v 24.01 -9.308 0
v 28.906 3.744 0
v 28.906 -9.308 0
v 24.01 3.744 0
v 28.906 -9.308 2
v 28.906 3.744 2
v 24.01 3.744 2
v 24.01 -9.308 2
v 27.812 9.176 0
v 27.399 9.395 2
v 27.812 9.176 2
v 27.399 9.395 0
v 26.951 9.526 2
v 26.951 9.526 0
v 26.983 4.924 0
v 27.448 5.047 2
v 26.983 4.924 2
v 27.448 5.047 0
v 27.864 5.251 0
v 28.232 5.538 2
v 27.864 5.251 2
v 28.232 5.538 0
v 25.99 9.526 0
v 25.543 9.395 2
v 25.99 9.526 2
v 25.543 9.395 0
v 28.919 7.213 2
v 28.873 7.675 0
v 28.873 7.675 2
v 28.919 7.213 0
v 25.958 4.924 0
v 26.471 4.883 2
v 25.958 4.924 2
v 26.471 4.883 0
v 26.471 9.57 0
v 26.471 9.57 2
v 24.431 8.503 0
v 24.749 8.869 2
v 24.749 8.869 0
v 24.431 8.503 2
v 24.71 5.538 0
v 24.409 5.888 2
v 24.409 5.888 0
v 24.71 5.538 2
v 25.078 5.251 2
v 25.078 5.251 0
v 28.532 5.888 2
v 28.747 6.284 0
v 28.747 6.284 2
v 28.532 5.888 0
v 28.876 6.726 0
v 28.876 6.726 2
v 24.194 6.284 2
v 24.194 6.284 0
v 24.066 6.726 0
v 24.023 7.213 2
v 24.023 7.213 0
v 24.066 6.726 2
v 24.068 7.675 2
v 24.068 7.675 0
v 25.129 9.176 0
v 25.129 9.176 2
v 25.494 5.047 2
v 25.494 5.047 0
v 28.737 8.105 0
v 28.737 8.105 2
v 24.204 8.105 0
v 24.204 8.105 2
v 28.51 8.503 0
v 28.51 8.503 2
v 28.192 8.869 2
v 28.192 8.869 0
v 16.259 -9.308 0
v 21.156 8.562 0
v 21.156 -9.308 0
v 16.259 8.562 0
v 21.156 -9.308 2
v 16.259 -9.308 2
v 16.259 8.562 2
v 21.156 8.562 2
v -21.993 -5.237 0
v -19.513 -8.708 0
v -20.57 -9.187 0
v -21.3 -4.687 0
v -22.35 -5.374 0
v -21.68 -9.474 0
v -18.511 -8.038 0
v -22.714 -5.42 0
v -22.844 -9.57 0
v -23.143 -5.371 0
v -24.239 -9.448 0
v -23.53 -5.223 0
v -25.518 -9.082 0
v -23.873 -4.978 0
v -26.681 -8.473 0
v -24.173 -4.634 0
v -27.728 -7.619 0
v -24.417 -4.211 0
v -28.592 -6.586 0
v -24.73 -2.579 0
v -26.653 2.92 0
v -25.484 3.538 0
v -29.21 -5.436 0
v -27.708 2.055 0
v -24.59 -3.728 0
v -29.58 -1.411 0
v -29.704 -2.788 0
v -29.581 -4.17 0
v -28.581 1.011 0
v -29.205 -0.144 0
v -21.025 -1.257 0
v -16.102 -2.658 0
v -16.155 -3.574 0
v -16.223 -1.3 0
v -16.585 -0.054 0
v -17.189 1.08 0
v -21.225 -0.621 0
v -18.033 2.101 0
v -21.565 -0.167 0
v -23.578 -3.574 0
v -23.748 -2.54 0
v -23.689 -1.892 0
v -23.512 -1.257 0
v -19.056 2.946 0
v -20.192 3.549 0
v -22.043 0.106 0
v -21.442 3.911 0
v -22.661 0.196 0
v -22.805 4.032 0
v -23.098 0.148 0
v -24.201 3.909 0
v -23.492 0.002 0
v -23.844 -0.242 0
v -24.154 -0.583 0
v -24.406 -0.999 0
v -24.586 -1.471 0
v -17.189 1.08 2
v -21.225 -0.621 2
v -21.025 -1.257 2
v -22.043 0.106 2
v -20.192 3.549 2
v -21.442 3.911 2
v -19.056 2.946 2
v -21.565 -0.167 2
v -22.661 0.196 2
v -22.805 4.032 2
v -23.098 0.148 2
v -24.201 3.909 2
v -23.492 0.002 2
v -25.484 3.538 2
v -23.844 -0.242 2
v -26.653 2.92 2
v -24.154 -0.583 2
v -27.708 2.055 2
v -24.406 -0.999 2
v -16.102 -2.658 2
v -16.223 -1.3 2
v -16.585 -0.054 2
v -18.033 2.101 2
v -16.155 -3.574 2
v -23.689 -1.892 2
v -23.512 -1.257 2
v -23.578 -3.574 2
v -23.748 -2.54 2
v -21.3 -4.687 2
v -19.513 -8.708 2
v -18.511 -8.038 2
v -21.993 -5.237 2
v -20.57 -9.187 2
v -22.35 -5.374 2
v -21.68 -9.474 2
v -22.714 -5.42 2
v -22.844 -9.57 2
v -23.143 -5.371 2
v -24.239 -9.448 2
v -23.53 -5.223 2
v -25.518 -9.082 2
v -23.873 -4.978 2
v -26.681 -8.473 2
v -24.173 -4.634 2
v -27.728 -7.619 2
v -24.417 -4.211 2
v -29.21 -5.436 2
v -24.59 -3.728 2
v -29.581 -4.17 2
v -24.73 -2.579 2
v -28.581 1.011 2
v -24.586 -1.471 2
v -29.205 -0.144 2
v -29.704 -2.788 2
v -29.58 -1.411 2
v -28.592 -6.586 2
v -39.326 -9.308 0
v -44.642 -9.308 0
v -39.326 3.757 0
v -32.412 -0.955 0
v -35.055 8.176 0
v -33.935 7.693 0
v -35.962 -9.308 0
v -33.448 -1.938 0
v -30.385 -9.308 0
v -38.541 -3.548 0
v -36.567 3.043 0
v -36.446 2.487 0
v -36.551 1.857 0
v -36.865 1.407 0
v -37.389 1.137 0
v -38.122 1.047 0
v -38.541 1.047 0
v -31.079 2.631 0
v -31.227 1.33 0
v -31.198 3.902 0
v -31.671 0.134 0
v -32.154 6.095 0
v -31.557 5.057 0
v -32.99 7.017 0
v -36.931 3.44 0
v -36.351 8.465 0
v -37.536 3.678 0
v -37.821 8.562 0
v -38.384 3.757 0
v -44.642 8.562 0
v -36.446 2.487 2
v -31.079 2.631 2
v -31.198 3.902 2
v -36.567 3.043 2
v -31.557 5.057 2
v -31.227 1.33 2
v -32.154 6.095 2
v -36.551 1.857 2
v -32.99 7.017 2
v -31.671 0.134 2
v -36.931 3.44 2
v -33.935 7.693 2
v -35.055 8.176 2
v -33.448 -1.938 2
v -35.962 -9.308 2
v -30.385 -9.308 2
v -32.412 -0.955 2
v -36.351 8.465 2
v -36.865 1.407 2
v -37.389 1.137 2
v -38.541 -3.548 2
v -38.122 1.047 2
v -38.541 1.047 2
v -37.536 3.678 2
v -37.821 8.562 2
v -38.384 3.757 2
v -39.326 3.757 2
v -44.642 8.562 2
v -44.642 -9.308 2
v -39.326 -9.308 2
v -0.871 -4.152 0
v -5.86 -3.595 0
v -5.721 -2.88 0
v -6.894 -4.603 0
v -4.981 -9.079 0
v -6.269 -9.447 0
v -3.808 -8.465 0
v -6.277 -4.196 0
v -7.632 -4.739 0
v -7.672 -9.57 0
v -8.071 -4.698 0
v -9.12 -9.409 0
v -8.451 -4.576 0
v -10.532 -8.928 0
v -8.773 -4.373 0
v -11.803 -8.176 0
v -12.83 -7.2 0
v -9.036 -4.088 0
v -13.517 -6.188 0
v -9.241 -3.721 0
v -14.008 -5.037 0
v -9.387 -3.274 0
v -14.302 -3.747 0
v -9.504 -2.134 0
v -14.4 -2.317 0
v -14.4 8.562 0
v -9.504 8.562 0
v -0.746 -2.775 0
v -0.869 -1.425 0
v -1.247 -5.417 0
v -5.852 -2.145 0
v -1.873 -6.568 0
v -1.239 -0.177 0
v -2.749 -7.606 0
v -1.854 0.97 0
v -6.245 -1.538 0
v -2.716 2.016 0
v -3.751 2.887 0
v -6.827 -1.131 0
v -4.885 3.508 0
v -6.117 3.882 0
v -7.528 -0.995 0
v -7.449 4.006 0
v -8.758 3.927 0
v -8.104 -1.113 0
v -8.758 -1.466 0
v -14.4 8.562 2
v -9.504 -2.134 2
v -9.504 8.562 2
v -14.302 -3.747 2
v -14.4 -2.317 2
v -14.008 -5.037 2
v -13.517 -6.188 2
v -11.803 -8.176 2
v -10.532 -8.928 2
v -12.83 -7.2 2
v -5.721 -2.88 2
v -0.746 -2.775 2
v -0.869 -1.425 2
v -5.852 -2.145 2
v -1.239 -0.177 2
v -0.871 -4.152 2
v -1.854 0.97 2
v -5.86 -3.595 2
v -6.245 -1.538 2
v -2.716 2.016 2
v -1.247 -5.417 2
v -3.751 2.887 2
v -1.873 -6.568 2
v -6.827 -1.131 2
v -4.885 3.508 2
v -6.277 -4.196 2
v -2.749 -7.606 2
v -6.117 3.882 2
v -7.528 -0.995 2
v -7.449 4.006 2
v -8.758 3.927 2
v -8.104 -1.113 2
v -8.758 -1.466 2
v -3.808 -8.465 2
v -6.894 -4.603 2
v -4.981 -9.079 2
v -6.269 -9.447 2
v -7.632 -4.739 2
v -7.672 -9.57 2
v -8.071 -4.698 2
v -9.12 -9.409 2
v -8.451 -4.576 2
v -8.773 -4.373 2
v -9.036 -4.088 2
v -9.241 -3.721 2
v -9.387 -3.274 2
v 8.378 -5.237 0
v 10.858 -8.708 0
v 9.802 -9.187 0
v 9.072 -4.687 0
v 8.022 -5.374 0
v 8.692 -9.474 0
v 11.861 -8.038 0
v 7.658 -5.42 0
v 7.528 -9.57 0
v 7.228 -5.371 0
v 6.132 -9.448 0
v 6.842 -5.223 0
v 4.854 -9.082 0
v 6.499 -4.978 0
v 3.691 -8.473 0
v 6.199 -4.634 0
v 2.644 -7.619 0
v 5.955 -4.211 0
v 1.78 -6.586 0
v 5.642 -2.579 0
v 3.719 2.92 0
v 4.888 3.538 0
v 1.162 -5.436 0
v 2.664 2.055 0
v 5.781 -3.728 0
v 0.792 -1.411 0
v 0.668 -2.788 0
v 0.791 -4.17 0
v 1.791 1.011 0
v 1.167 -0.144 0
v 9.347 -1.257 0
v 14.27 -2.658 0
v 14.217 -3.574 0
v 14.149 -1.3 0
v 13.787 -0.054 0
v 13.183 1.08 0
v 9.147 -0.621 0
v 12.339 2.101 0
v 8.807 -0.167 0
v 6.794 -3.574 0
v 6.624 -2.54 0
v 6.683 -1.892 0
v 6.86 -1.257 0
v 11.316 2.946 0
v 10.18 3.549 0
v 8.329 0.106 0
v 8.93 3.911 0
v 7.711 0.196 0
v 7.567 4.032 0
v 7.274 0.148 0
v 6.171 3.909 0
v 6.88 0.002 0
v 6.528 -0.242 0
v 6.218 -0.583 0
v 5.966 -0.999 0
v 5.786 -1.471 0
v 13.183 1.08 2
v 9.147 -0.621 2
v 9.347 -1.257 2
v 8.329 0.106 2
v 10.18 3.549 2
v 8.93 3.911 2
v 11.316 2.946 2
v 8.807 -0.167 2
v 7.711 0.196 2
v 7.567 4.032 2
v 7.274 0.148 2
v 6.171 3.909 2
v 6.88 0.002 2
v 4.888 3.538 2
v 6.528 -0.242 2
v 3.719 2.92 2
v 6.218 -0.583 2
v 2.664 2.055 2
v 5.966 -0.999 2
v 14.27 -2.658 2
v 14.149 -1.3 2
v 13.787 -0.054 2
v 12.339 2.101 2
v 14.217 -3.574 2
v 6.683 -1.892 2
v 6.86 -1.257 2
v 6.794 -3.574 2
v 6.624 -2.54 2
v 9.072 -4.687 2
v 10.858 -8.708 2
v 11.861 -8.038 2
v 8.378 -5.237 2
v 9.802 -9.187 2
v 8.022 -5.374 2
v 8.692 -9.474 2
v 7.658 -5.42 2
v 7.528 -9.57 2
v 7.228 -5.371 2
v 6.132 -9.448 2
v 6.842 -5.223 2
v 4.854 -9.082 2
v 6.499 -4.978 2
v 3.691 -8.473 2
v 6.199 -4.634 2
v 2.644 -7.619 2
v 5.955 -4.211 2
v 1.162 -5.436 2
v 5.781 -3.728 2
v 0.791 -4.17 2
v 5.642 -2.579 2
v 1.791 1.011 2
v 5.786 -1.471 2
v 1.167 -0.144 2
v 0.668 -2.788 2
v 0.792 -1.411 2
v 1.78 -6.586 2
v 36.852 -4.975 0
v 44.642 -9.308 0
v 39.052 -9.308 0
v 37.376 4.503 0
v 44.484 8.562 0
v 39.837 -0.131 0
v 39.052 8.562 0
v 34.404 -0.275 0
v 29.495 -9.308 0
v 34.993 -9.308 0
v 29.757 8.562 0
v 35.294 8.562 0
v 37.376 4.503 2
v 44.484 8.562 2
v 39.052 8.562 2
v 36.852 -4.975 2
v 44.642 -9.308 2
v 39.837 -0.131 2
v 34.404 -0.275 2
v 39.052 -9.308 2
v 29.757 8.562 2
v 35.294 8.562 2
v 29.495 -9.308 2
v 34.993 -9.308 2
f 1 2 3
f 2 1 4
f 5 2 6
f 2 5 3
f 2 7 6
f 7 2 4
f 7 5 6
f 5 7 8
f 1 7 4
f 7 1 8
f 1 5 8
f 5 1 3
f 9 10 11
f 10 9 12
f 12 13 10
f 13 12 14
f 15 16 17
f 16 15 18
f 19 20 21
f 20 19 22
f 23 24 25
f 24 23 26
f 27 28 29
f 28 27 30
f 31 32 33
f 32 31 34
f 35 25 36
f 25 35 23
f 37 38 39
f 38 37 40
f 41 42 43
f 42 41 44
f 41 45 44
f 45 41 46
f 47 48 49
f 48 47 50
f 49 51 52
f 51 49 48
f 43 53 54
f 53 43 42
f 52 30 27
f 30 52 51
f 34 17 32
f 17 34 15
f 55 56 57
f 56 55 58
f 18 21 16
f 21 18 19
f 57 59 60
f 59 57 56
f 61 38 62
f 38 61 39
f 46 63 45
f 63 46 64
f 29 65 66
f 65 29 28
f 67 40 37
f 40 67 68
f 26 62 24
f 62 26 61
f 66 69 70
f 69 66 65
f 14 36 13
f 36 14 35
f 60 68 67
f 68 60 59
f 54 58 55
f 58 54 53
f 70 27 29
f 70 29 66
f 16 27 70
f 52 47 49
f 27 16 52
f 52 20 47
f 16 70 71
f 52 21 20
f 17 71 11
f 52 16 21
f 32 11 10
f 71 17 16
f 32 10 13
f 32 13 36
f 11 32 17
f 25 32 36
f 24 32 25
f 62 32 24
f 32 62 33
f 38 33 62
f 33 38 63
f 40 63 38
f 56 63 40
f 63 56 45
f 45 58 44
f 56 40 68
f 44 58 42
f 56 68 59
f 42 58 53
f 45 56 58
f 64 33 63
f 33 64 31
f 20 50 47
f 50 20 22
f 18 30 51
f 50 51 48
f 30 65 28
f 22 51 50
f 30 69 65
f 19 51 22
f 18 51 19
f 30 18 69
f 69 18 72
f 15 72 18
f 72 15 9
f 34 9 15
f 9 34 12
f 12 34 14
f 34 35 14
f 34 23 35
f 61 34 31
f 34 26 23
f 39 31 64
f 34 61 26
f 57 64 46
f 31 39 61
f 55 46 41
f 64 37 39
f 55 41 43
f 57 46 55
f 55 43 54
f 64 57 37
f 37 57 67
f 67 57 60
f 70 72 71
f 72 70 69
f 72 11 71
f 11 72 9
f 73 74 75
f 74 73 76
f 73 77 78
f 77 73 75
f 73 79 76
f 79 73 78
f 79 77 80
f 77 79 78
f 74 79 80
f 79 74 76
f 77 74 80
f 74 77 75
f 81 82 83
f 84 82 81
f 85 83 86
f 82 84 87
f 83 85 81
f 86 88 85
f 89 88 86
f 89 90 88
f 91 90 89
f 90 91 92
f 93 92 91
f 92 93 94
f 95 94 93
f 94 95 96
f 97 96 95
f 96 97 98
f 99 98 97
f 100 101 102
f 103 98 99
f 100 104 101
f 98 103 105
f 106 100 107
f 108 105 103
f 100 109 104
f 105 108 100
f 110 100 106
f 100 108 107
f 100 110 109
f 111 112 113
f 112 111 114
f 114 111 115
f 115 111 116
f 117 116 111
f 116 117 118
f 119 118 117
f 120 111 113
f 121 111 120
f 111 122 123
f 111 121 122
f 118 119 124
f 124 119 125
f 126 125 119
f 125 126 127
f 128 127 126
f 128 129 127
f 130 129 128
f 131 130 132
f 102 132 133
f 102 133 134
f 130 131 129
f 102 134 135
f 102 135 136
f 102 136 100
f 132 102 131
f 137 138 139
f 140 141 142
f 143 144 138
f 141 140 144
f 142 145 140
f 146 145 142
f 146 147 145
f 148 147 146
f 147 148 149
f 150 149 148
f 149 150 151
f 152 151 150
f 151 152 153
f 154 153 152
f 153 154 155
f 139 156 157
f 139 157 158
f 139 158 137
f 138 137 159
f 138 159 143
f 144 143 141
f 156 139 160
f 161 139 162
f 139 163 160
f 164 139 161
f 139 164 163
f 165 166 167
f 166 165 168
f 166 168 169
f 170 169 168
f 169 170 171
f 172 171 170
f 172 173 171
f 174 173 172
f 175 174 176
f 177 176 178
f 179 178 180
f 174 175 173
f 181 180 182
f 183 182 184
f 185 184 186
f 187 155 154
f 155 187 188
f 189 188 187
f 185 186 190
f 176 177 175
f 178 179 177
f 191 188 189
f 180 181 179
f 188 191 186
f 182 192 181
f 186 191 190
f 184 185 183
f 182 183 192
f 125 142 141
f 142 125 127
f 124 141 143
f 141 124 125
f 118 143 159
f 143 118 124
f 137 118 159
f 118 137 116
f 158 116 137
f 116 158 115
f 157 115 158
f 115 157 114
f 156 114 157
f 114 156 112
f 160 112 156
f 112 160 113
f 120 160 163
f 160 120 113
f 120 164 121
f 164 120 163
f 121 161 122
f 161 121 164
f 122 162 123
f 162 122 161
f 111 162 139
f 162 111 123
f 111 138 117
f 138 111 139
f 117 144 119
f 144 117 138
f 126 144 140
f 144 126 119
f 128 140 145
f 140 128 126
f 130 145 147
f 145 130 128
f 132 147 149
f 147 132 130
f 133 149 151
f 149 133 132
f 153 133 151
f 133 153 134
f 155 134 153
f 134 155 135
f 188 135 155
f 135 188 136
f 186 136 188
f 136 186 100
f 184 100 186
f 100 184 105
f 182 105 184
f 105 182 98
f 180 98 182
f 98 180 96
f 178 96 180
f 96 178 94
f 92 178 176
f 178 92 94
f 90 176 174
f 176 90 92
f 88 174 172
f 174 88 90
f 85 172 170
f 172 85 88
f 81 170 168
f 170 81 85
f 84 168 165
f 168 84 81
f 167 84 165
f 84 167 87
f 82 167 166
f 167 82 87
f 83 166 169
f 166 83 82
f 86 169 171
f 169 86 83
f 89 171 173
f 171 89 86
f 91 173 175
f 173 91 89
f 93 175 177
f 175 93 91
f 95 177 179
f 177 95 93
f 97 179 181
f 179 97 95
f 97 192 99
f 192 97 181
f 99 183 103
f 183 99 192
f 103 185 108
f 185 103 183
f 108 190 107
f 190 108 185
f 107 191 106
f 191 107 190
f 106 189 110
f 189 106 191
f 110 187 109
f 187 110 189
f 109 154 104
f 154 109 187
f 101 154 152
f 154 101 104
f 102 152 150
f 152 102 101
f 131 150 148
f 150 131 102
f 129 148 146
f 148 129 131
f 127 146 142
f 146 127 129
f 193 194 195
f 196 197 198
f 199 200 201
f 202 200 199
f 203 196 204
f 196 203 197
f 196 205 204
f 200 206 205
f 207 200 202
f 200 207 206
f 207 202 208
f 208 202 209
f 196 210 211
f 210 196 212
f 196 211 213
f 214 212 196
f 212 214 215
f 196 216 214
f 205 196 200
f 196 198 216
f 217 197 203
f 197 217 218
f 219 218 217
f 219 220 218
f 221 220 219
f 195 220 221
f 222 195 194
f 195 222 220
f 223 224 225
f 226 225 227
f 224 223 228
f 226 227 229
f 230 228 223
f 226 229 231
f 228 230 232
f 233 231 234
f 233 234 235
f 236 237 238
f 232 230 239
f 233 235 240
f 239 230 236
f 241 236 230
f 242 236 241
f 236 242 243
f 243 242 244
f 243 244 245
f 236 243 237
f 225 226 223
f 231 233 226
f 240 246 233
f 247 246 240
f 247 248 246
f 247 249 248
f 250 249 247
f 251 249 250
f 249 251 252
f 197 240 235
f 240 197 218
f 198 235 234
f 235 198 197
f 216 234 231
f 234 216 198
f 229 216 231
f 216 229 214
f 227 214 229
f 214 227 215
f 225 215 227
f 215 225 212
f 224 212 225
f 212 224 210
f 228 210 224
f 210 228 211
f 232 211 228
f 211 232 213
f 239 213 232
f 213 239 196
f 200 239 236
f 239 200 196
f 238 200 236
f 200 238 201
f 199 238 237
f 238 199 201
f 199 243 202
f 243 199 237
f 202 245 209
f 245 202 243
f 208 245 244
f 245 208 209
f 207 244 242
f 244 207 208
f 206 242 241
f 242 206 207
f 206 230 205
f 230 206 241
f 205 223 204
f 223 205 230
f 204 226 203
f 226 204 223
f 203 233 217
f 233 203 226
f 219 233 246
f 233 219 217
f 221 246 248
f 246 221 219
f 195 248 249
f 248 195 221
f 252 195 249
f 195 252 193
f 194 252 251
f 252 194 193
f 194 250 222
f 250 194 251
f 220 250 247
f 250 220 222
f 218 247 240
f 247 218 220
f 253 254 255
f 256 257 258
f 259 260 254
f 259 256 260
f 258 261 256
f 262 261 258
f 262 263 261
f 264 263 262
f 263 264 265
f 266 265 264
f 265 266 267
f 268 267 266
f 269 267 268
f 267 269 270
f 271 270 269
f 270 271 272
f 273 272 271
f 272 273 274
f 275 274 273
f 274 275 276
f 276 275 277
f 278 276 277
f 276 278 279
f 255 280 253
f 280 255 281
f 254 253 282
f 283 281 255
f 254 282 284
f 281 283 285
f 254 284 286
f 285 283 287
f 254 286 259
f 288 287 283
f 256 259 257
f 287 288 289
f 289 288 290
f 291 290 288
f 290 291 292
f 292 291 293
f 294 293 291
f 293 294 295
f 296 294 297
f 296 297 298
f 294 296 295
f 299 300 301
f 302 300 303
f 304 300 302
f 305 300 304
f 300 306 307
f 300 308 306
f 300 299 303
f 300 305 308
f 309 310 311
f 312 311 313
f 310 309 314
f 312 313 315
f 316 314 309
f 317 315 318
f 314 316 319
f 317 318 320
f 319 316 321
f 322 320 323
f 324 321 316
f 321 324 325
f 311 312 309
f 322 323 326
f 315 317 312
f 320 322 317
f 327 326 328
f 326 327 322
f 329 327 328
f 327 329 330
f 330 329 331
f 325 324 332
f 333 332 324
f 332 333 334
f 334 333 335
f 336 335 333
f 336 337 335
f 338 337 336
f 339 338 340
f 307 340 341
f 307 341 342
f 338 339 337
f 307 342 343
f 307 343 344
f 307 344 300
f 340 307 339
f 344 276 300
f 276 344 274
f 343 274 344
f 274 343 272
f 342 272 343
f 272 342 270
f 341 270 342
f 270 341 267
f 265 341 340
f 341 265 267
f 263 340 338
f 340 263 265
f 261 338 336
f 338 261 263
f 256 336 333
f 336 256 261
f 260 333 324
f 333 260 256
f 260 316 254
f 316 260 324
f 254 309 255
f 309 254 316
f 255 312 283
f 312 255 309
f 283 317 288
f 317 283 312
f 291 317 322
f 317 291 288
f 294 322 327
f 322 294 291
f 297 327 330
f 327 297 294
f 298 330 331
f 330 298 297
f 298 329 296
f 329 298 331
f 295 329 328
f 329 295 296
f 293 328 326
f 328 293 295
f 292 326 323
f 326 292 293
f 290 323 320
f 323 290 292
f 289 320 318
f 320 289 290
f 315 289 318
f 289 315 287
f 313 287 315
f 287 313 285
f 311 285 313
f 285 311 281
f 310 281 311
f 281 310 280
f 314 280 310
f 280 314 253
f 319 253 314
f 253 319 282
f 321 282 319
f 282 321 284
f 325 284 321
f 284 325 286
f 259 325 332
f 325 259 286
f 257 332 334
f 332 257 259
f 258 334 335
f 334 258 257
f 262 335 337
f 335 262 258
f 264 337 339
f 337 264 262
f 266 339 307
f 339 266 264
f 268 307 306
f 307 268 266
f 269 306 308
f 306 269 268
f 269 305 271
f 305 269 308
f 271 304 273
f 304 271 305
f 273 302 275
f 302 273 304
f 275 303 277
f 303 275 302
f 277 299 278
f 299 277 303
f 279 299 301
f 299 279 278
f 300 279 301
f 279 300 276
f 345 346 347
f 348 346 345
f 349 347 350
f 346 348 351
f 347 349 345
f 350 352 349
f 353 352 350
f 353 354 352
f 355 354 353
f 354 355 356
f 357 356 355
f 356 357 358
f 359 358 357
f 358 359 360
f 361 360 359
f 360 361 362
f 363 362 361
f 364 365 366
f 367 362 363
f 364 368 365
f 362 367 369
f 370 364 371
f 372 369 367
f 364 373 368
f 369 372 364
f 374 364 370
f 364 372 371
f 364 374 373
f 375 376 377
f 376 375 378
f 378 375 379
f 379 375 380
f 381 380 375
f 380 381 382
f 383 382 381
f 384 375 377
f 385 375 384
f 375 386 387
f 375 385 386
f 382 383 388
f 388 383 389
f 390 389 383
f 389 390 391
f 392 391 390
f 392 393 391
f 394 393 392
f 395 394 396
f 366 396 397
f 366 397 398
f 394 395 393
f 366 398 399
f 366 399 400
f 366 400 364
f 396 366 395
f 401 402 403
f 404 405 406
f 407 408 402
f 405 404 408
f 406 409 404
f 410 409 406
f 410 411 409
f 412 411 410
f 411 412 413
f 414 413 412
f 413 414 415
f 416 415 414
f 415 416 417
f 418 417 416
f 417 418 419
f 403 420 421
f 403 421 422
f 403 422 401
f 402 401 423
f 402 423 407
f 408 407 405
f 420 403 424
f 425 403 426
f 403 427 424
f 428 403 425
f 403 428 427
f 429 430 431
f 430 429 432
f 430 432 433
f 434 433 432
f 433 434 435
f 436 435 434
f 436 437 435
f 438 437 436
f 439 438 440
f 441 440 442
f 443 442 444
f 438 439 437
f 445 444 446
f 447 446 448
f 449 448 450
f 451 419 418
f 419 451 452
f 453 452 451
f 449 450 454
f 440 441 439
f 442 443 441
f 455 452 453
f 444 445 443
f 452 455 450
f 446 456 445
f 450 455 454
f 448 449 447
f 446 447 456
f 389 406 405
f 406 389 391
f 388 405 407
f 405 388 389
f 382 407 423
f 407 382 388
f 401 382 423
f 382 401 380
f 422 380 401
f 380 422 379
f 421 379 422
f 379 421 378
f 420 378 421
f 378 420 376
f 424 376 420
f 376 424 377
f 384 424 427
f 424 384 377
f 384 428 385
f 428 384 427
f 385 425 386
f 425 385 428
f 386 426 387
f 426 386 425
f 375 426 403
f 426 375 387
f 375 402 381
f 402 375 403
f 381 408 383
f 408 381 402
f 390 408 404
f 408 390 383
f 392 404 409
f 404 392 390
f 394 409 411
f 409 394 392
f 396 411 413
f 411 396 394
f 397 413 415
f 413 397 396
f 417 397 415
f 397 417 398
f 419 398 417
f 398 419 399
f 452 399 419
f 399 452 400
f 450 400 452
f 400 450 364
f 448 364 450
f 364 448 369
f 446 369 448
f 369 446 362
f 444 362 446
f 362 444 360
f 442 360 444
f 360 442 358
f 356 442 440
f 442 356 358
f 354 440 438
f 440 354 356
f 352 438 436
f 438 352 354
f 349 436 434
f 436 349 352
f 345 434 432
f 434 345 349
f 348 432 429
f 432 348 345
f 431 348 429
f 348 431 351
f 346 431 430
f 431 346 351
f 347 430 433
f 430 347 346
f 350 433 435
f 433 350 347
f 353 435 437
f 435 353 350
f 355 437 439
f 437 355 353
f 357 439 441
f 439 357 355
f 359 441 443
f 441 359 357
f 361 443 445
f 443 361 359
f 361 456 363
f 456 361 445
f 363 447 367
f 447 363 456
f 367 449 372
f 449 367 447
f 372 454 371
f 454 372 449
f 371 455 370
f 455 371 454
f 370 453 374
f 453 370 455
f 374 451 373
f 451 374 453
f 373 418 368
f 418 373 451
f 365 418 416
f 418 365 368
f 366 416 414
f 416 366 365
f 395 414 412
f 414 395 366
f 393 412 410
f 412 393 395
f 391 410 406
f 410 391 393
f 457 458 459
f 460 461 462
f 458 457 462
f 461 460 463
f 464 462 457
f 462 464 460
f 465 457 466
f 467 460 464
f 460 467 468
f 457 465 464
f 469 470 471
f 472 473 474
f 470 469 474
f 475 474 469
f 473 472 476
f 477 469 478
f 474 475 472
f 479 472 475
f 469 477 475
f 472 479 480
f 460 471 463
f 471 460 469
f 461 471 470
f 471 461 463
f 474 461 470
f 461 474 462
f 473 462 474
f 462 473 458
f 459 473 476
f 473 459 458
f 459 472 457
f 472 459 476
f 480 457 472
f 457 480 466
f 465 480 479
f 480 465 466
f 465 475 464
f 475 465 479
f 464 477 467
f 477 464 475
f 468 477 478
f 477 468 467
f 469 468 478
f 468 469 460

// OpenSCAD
// Module names are of the form poly_<inkscape-path-id>().  As a result,
// you can associate a polygon in this OpenSCAD program with the corresponding
// SVG element in the Inkscape document by looking for the XML element with
// the attribute id="inkscape-path-id".

// fudge value is used to ensure that subtracted solids are a tad taller
// in the z dimension than the polygon being subtracted from.  This helps
// keep the resulting .stl file manifold.
fudge = 0.1;

module poly_path3169(h)
{
  scale([25.4/90, -25.4/90, 1]) union()
  {
    linear_extrude(height=h)
      polygon([[74.960940,-30.336910],[74.960940,32.980960],[57.612310,32.980960],[57.612310,-30.336910]]);
  }
}

module poly_path3163(h)
{
  scale([25.4/90, -25.4/90, 1]) union()
  {
    linear_extrude(height=h)
      polygon([[-57.241210,12.663580],[-83.542480,12.663580],[-84.145510,8.999020],[-83.936785,6.702904],[-83.310550,4.453130],[-74.497070,4.453130],[-75.207384,2.200490],[-76.410545,0.591455],[-78.106554,-0.373975],[-80.295410,-0.695800],[-81.843581,-0.523282],[-83.240985,-0.005773],[-84.487624,0.856725],[-85.583500,2.064210],[-86.476452,3.541354],[-87.114271,5.212729],[-87.624510,9.138180],[-87.131669,13.208634],[-86.515593,14.922040],[-85.653080,16.420900],[-84.590546,17.638558],[-83.374347,18.508312],[-82.004486,19.030160],[-80.480960,19.204100],[-79.193740,19.041757],[-77.929706,18.554700],[-75.471190,16.606450],[-65.590820,28.481450],[-69.142321,30.855868],[-72.885155,32.551880],[-76.819321,33.569488],[-80.944820,33.908690],[-85.887918,33.476714],[-90.419325,32.180786],[-94.539042,30.020905],[-98.247070,26.997070],[-101.311495,23.335423],[-103.500369,19.262092],[-104.813691,14.777075],[-105.251460,9.880370],[-104.809342,4.998187],[-103.482975,0.510280],[-101.272357,-3.583352],[-98.177490,-7.282710],[-94.439019,-10.347111],[-90.297559,-12.535976],[-85.753107,-13.849308],[-80.805660,-14.287110],[-75.974212,-13.859454],[-71.545737,-12.576562],[-67.520234,-10.438434],[-63.897700,-7.445070],[-60.904336,-3.825435],[-58.766207,0.191373],[-57.483316,4.605353],[-57.055660,9.416510],[-57.241210,12.663580]]);
  }
}

module poly_path3161(h)
{
  scale([25.4/90, -25.4/90, 1]) union()
  {
    linear_extrude(height=h)
      polygon([[-139.345700,-13.312990],[-139.345700,32.980960],[-158.178710,32.980960],[-158.178710,-30.336910],[-134.011230,-30.336910],[-128.801443,-29.994775],[-124.212065,-28.968459],[-120.243095,-27.257961],[-116.894530,-24.863280],[-113.931608,-21.595888],[-111.815224,-17.916832],[-110.545377,-13.826113],[-110.122070,-9.323730],[-110.646849,-4.711132],[-112.221109,-0.475439],[-114.844850,3.383352],[-118.518070,6.865240],[-107.663570,32.980960],[-127.424320,32.980960],[-136.562500,12.570800],[-136.562500,-3.710940],[-135.078120,-3.710940],[-132.480483,-4.029825],[-130.625022,-4.986543],[-129.511735,-6.581093],[-129.140620,-8.813480],[-129.569720,-10.781990],[-130.856959,-12.188077],[-133.002339,-13.031743],[-136.005860,-13.312990]]);
  }
}

module poly_path3165(h)
{
  scale([25.4/90, -25.4/90, 1]) union()
  {
    linear_extrude(height=h)
      polygon([[-33.676760,-30.336910],[-33.676760,7.561040],[-33.262190,11.599593],[-32.743966,13.186166],[-32.018450,14.484269],[-31.085641,15.493903],[-29.945540,16.215067],[-28.598146,16.647763],[-27.043460,16.791990],[-24.428426,16.310744],[-22.242430,14.866940],[-20.763879,12.738967],[-20.271000,10.205080],[-20.734889,7.601642],[-22.126460,5.450440],[-24.190692,4.006674],[-26.672360,3.525390],[-28.713395,3.942892],[-31.032710,5.195310],[-31.032710,-13.916010],[-26.394040,-14.194330],[-21.675662,-13.753634],[-17.308071,-12.431605],[-13.291265,-10.228244],[-9.625240,-7.143550],[-6.570995,-3.438394],[-4.389379,0.626248],[-3.080394,5.050376],[-2.644040,9.833990],[-3.087641,14.713297],[-4.418369,19.192514],[-6.636225,23.271641],[-9.741210,26.950680],[-13.492759,29.994812],[-17.650175,32.169190],[-22.213461,33.473815],[-27.182620,33.908690],[-32.314164,33.340452],[-37.318110,31.635740],[-41.823436,28.968510],[-45.458980,25.512700],[-47.894289,21.926430],[-49.633791,17.847300],[-50.677491,13.275307],[-51.025390,8.210450],[-51.025390,-30.336910]]);
  }
}

module poly_path3167(h)
{
  scale([25.4/90, -25.4/90, 1]) union()
  {
    linear_extrude(height=h)
      polygon([[50.375980,12.663580],[24.074710,12.663580],[23.471680,8.999020],[23.680405,6.702904],[24.306640,4.453130],[33.120120,4.453130],[32.409806,2.200490],[31.206645,0.591455],[29.510636,-0.373975],[27.321780,-0.695800],[25.773609,-0.523282],[24.376205,-0.005773],[23.129566,0.856725],[22.033690,2.064210],[21.140734,3.541354],[20.502915,5.212729],[19.992680,9.138180],[20.485521,13.208634],[21.101597,14.922040],[21.964110,16.420900],[23.026644,17.638558],[24.242843,18.508312],[25.612704,19.030160],[27.136230,19.204100],[28.423444,19.041757],[29.687476,18.554700],[32.146000,16.606450],[42.026370,28.481450],[38.474864,30.855868],[34.732030,32.551880],[30.797863,33.569488],[26.672360,33.908690],[21.729267,33.476714],[17.197864,32.180786],[13.078148,30.020905],[9.370120,26.997070],[6.305695,23.335423],[4.116820,19.262092],[2.803495,14.777075],[2.365720,9.880370],[2.807843,4.998187],[4.134214,0.510280],[6.344832,-3.583352],[9.439700,-7.282710],[13.178171,-10.347111],[17.319630,-12.535976],[21.864079,-13.849308],[26.811520,-14.287110],[31.642968,-13.859454],[36.071443,-12.576562],[40.096946,-10.438434],[43.719480,-7.445070],[46.712849,-3.825435],[48.850976,0.191373],[50.133866,4.605353],[50.561520,9.416510],[50.375980,12.663580]]);
  }
}

module poly_path3171(h)
{
  scale([25.4/90, -25.4/90, 1]) union()
  {
    linear_extrude(height=h)
      polygon([[102.421880,-13.266600],[102.421880,32.980960],[85.073240,32.980960],[85.073240,-13.266600]]);
    linear_extrude(height=h)
      polygon([[93.793950,-33.908690],[95.497200,-33.753545],[97.081591,-33.288215],[98.547124,-32.512700],[99.893800,-31.427000],[101.020116,-30.129588],[101.824631,-28.719131],[102.307345,-27.195629],[102.468260,-25.559080],[102.316042,-23.831146],[101.859419,-22.265584],[101.098391,-20.862395],[100.032960,-19.621580],[98.729775,-18.606843],[97.255545,-17.882040],[95.610270,-17.447172],[93.793950,-17.302240],[91.977613,-17.447172],[90.332331,-17.882040],[88.858104,-18.606843],[87.554930,-19.621580],[86.489482,-20.862395],[85.728449,-22.265584],[85.271831,-23.831146],[85.119630,-25.559080],[85.280529,-27.195629],[85.763240,-28.719131],[86.567761,-30.129588],[87.694090,-31.427000],[89.040749,-32.512700],[90.506278,-33.288215],[92.090677,-33.753545],[93.793950,-33.908690]]);
  }
}

module poly_path3173(h)
{
  scale([25.4/90, -25.4/90, 1]) union()
  {
    linear_extrude(height=h)
      polygon([[157.622070,-30.336910],[141.154790,0.463870],[158.178710,32.980960],[138.371580,32.980960],[130.578610,17.626950],[123.991700,32.980960],[104.509280,32.980960],[121.904300,0.974120],[105.437010,-30.336910],[125.058590,-30.336910],[132.434080,-15.957030],[138.371580,-30.336910]]);
  }
}

module text_RebeliX(h)
{

poly_path3169(h);
poly_path3163(h);
poly_path3161(h);
poly_path3165(h);
poly_path3167(h);
poly_path3171(h);
poly_path3173(h);
}

text_RebeliX(2);
